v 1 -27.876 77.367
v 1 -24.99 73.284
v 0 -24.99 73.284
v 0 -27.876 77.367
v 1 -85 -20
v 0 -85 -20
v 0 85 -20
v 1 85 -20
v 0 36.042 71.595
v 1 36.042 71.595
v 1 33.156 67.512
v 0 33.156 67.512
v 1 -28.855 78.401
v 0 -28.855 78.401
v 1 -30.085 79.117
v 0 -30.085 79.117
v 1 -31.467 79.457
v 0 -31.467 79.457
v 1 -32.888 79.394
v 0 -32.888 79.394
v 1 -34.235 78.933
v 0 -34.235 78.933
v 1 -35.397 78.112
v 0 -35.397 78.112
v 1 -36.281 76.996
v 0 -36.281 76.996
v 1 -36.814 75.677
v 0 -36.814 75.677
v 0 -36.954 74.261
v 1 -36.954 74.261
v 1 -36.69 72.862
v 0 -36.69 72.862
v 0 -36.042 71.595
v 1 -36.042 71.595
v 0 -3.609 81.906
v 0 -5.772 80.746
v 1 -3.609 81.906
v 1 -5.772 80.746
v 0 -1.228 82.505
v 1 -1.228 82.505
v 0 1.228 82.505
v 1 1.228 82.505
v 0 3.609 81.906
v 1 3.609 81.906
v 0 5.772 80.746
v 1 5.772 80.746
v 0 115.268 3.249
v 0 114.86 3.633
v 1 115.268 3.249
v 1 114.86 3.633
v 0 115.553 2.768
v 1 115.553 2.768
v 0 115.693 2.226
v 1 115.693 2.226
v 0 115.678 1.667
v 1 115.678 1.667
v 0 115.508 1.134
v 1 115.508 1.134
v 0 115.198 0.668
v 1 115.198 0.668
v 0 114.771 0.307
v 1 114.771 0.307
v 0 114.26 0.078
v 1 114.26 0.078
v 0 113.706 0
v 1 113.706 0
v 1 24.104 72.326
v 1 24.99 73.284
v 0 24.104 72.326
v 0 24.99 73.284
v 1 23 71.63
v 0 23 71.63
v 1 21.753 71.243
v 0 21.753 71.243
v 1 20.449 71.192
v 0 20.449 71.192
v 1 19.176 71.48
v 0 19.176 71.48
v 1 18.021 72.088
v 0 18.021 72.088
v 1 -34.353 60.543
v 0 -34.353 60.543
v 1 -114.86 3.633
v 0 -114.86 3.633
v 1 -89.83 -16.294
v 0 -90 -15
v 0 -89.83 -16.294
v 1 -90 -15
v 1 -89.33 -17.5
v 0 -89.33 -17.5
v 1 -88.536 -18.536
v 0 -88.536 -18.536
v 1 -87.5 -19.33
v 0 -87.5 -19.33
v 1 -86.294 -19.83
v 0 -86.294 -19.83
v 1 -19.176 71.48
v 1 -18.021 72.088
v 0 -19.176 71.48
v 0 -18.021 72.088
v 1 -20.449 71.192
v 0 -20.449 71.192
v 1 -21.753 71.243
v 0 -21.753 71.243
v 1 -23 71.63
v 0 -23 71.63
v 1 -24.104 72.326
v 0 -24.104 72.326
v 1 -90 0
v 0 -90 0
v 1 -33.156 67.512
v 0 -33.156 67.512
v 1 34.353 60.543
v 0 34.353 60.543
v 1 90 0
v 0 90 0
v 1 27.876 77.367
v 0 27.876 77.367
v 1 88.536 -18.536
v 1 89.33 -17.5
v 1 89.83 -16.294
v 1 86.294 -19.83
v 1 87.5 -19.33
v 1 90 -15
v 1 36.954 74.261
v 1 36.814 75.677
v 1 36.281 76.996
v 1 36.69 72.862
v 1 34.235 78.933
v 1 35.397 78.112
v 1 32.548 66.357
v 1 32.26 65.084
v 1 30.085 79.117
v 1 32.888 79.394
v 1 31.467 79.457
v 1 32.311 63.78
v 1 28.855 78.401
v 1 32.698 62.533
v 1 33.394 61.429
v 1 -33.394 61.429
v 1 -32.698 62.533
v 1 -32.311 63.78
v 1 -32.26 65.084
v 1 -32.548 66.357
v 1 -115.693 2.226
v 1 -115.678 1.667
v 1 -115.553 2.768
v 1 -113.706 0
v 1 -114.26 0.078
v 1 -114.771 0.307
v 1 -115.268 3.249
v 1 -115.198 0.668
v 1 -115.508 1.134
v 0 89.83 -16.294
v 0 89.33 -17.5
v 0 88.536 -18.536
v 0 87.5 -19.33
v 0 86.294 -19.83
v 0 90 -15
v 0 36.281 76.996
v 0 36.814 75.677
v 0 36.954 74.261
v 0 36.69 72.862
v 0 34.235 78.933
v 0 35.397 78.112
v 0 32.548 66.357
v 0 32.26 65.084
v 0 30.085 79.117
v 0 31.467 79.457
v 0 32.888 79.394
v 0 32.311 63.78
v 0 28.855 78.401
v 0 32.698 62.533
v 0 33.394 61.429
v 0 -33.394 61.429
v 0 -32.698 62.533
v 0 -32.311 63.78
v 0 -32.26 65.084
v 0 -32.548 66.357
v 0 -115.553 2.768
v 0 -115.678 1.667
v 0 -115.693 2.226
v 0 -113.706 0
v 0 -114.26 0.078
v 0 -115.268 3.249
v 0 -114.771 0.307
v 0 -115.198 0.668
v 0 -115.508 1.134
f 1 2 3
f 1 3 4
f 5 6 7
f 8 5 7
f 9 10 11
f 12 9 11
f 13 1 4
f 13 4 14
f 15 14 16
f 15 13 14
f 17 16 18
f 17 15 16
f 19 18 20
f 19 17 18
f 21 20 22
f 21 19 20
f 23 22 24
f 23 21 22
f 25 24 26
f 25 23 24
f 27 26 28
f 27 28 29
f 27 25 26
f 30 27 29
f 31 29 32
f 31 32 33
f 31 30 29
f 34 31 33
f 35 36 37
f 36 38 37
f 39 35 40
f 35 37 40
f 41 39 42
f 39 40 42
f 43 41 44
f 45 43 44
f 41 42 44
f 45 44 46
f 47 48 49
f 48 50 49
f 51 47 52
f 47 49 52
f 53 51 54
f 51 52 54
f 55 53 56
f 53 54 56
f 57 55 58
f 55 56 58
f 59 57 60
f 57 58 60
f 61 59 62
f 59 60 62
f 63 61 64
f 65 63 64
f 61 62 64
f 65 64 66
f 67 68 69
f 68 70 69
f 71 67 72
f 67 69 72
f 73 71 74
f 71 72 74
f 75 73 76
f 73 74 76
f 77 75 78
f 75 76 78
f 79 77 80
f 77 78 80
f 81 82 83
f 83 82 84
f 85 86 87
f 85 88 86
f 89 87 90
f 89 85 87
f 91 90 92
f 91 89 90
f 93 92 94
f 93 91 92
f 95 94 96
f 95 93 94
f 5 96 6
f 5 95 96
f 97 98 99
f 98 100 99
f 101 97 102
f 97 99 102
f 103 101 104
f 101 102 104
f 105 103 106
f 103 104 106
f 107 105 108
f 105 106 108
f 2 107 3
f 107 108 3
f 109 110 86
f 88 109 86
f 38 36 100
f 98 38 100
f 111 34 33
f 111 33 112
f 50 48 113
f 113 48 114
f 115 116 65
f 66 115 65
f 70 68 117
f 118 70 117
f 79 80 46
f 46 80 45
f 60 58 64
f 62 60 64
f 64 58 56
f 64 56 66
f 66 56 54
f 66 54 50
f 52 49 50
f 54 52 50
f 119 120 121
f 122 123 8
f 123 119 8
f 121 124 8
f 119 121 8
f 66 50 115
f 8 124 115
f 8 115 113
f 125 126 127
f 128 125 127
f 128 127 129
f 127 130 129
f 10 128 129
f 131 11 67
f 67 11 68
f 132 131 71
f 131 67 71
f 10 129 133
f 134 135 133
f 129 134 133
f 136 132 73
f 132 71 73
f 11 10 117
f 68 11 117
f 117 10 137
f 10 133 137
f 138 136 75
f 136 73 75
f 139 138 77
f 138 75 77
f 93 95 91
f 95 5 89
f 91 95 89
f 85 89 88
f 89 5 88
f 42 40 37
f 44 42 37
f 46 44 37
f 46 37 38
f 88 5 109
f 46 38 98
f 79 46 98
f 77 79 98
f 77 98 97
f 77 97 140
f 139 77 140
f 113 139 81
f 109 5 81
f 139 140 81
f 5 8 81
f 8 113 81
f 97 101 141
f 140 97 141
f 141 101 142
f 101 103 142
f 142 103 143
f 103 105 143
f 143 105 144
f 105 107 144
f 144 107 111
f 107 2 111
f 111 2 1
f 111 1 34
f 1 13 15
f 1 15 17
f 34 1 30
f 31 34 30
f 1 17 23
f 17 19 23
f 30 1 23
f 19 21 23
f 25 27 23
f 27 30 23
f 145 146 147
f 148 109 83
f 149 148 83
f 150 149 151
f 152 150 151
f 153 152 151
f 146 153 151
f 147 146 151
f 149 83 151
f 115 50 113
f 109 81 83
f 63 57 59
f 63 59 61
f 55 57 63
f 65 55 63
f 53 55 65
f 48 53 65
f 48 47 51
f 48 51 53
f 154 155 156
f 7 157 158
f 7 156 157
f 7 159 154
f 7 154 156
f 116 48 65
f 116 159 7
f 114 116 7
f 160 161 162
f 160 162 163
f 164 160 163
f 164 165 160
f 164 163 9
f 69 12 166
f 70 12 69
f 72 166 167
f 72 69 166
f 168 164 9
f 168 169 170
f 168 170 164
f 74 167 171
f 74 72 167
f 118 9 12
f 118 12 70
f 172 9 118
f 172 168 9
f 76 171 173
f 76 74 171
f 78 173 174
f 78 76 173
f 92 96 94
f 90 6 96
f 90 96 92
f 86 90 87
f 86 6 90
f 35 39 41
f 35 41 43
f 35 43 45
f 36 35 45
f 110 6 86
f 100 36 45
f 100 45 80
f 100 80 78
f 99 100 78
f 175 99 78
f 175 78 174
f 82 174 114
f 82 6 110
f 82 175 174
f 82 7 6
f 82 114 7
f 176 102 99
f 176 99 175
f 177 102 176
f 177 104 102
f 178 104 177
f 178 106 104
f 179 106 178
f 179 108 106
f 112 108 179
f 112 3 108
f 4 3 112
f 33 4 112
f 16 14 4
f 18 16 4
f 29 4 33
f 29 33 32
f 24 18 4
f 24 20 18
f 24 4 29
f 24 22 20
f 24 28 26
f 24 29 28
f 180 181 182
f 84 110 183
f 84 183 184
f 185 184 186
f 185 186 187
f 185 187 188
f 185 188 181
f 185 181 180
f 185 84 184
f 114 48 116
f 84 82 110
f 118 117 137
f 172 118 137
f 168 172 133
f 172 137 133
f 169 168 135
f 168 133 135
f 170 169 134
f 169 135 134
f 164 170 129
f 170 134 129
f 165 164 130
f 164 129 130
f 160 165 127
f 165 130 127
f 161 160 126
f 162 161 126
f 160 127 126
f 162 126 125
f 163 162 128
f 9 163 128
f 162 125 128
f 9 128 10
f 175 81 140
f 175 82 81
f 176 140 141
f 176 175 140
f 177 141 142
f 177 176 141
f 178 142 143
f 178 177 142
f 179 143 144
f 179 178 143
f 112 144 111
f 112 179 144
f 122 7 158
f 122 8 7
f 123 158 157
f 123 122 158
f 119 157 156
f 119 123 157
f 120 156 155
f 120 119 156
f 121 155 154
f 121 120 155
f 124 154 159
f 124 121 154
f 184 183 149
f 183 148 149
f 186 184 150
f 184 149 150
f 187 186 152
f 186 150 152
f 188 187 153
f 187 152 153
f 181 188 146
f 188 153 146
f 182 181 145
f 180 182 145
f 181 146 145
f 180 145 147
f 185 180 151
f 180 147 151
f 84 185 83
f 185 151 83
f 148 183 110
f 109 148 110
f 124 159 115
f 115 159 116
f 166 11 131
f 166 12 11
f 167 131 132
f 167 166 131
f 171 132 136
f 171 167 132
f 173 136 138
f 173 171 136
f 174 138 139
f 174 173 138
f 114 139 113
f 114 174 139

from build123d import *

# Parameters (mm, degrees)
F1_DEPTH = 1
F2_R     = 5
F3_R     = 2
F4_R     = 10
F6_DEPTH = 1
F8_R     = 5


with BuildPart() as f1:
    # F0 (on Right) → F1 (new body)
    with BuildSketch(Plane.YZ):
        Polygon((90, 0), (120, 0), (0, 84.8264595052), (-120, 0), (-90, 0), (-90, -20), (90, -20), align=None)
    extrude(amount=F1_DEPTH)

    # F2
    f2_edges = [f1.edges().sort_by_distance(p)[0] for p in [
        (0.5, -90, -20),
        (0.5, 90, -20),
    ]]
    fillet(f2_edges, radius=F2_R)

    # F3
    f3_edges = [f1.edges().sort_by_distance(p)[0] for p in [
        (0.5, 120, 0),
        (0.5, -120, 0),
    ]]
    fillet(f3_edges, radius=F3_R)

    # F4
    f4_edges = [f1.edges().sort_by_distance(p)[0] for p in [
        (0.5, 0, 84.82646),
    ]]
    fillet(f4_edges, radius=F4_R)

    # F5 (on face) → F6 (join, through all)
    with BuildSketch(Plane.YZ.offset(1)):
        with BuildLine():
            Line((-30.2697404192, 63.4291685894), (-22.1039292974, 69.2014756431))
            Line((-22.1039292974, 69.2014756431), (-27.8762363511, 77.3672867649))
            ThreePointArc((-27.8762363511, 77.3672867649), (-34.8452954389, 78.564038799), (-36.042047473, 71.5949797112))
            Line((-36.042047473, 71.5949797112), (-30.2697404192, 63.4291685894))
        make_face()
    extrude(amount=-F6_DEPTH)

    # F7: F1 across plane


with BuildPart() as f1_1:
    add(f1.part)
    add(f1.part.mirror(Plane.XZ))

    # F8
    f8_edges = [f1_1.edges().sort_by_distance(p)[0] for p in [
        (0.5, -30.26974, 63.429169),
        (0.5, -22.103929, 69.201476),
        (0.5, 22.103929, 69.201476),
        (0.5, 30.26974, 63.429169),
    ]]
    fillet(f8_edges, radius=F8_R)


solid = f1_1.part
